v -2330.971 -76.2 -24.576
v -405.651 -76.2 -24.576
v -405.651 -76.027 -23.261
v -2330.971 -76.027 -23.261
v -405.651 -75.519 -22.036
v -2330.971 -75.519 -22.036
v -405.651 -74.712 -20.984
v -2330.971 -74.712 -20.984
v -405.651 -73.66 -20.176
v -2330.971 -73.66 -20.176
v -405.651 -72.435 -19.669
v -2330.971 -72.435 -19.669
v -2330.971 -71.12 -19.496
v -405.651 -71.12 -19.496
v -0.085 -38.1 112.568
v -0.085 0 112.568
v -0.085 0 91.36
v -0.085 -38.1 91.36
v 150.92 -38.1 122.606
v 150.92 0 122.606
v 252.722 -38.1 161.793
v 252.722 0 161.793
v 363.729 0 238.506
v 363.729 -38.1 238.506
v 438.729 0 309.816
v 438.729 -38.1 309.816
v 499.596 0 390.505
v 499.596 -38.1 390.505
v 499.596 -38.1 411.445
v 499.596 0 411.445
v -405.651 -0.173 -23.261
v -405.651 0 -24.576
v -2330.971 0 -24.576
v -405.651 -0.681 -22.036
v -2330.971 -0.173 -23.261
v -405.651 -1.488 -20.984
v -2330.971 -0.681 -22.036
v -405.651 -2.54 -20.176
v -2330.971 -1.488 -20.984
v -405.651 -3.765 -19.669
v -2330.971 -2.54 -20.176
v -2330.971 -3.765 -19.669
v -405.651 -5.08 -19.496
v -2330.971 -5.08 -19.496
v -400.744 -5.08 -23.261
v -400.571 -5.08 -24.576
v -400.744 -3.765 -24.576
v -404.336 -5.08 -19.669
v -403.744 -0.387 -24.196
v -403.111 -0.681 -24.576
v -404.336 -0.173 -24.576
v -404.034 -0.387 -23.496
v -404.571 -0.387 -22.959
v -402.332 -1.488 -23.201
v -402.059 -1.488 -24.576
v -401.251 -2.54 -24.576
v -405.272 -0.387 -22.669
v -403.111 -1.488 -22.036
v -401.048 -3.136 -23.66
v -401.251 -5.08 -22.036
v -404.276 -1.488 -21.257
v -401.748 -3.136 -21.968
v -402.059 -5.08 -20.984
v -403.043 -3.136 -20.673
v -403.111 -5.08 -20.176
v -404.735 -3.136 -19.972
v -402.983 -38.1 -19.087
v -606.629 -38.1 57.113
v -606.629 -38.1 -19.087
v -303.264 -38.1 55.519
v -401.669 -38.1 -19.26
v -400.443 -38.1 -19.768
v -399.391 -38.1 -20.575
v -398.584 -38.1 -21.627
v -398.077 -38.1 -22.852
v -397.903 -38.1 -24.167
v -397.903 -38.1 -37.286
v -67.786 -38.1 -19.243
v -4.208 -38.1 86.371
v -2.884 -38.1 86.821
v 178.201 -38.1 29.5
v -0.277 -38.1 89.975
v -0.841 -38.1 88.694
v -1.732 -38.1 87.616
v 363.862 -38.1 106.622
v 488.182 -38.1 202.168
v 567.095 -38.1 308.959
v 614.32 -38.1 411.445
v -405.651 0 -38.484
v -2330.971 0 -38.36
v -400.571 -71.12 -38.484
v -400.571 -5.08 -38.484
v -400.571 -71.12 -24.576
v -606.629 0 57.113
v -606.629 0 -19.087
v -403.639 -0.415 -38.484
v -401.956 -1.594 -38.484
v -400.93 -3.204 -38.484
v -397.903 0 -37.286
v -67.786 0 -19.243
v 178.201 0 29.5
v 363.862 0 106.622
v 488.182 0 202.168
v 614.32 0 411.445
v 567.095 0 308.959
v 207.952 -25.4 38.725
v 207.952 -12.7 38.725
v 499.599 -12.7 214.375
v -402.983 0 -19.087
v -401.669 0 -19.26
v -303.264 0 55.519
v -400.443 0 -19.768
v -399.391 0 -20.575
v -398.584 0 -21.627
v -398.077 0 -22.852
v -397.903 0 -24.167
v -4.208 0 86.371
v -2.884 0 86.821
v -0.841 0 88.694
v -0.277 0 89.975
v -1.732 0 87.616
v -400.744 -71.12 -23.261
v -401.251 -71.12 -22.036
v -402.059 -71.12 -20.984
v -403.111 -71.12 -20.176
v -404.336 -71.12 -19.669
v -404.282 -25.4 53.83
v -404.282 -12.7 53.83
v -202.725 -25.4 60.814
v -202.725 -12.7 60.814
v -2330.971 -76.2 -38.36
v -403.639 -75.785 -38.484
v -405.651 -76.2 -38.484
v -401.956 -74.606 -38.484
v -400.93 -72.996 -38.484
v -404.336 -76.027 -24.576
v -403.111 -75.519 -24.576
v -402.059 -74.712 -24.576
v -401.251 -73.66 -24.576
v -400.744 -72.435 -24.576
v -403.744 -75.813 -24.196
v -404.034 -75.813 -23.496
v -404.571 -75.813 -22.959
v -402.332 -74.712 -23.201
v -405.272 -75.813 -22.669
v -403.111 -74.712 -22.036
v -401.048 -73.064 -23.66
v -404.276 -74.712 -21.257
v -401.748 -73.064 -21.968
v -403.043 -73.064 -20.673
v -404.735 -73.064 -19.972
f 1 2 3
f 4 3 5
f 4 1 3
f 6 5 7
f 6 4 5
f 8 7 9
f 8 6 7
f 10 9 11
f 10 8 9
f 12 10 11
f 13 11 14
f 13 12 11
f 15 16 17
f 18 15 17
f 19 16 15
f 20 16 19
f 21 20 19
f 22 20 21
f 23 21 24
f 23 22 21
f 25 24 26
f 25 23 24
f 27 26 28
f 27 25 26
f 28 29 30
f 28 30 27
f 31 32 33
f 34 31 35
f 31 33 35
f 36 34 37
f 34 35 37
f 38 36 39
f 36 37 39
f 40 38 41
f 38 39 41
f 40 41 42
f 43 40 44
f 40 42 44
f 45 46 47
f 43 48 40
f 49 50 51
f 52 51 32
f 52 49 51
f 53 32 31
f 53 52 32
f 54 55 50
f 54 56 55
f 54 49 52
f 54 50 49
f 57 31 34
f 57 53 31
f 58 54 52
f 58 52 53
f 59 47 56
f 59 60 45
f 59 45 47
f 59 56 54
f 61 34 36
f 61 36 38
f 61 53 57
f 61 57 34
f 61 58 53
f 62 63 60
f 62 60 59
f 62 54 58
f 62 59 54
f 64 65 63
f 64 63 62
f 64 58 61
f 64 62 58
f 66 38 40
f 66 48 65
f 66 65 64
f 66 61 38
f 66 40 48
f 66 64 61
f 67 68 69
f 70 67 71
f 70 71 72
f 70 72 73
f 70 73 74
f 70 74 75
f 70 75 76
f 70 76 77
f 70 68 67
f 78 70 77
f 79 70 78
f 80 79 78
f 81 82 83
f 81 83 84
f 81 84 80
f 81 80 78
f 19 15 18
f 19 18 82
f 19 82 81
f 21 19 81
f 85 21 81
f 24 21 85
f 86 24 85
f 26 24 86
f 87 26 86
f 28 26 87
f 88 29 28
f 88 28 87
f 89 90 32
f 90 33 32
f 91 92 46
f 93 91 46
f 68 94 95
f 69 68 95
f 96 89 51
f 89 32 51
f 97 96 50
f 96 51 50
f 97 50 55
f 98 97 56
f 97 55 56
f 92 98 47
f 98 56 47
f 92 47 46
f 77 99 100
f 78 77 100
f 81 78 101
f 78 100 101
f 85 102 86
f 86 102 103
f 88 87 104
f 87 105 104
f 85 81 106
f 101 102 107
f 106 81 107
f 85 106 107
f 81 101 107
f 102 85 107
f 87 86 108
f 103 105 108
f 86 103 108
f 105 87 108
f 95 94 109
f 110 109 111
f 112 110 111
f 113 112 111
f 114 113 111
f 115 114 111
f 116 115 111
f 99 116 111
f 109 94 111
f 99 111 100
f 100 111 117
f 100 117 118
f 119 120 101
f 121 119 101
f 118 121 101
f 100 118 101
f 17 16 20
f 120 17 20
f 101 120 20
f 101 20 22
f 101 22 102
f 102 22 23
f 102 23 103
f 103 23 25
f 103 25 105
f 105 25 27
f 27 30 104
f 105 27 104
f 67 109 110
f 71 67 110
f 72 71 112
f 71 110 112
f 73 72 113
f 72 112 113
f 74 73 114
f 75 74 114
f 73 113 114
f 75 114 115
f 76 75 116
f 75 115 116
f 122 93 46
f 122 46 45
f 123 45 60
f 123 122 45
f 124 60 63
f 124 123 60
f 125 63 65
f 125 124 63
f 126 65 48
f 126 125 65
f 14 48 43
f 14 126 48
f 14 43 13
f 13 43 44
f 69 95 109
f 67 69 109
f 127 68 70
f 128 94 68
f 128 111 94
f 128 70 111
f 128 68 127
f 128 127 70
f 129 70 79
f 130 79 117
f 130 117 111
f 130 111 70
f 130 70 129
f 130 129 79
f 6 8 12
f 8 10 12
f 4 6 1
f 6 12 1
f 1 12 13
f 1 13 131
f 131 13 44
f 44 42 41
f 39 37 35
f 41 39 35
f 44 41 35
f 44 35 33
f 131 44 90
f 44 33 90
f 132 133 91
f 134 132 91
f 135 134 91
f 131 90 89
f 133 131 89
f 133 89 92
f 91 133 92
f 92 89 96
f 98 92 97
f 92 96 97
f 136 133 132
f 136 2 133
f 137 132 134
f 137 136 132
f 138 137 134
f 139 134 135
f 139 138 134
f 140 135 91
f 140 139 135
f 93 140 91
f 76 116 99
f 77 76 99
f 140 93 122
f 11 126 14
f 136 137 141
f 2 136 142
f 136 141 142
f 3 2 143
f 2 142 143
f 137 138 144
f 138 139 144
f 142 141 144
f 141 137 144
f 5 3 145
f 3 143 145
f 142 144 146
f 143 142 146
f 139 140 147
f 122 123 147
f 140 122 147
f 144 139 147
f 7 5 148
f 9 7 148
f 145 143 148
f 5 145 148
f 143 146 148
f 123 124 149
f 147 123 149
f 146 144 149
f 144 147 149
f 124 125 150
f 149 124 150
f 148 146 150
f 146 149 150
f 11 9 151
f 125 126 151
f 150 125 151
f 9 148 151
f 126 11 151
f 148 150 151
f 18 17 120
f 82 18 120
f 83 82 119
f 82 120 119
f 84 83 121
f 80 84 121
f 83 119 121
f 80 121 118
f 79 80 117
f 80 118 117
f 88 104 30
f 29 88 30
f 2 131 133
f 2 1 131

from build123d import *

# Parameters (mm, degrees)
F1_DEPTH = 38.1
F3_DEPTH = 76.2
F4_R     = 5.08
F5_R     = 5.08
F6_R     = 5.08


with BuildPart() as f1:
    # F0 (on Front) → F1 (new body)
    with BuildSketch(Plane.XZ):
        with BuildLine():
            add(Edge.make_bspline(
                [(-397.9034916449, -37.2863032911), (410.8181435335, -37.1667715246), (542.3002453184, 229.7381759582), (614.3201670874, 411.4448271791)],
                knots=[0, 0, 0, 0, 1107.2291374194, 1107.2291374194, 1107.2291374194, 1107.2291374194], degree=3))
            Line((614.3201670874, 411.4448271791), (499.5962828133, 411.4448271791))
            Line((499.5962828133, 411.4448271791), (499.5962828133, 390.5045126412))
            add(Edge.make_bspline(
                [(-0.08459932, 112.5677610649), (138.9812140865, 104.8921065828), (289.8373497184, 164.1537835287), (451.0105705046, 310.1172410619), (499.5962828133, 390.5045126412)],
                knots=[0, 0, 0, 0, 0.5062424529, 1, 1, 1, 1], degree=3))
            Line((-0.08459932, 112.5677610649), (-0.08459932, 91.3603947808))
            ThreePointArc((-0.08459932, 91.3603947808), (-1.2489795154, 88.1239891285), (-4.2083479602, 86.37120814))
            add(Edge.make_bspline(
                [(-606.6288212141, 57.1127695403), (-404.6368126357, 51.4652566588), (-200.4539536083, 48.7578373083), (-4.2083479602, 86.37120814)],
                knots=[0, 0, 0, 0, 603.0630991795, 603.0630991795, 603.0630991795, 603.0630991795], degree=3))
            Line((-606.6288212141, 57.1127695403), (-606.6288212141, -19.0872304597))
            Line((-606.6288212141, -19.0872304597), (-402.9834916449, -19.0872304597))
            ThreePointArc((-402.9834916449, -19.0872304597), (-399.3913891965, -20.5751280112), (-397.9034916449, -24.1672304597))
            Line((-397.9034916449, -24.1672304597), (-397.9034916449, -37.2863032911))
        make_face()
    extrude(amount=F1_DEPTH)


with BuildPart() as f3:
    # F2 (on Front) → F3 (new body)
    with BuildSketch(Plane.XZ):
        Polygon((-2330.9707720995, -38.3599539625), (-400.5707720995, -38.4839051044), (-400.5707720995, -19.4956134433), (-2330.9707720995, -19.4956134433), align=None)
    extrude(amount=F3_DEPTH)

    # F4
    f4_edges = [f3.edges().sort_by_distance(p)[0] for p in [
        (-400.570772, -38.1, -19.495613),
    ]]
    fillet(f4_edges, radius=F4_R)

    # F5
    f5_edges = [f3.edges().sort_by_distance(p)[0] for p in [
        (-1368.310772, -76.2, -19.495613),
    ]]
    fillet(f5_edges, radius=F5_R)

    # F6
    f6_edges = [f3.edges().sort_by_distance(p)[0] for p in [
        (-1368.310772, 0, -19.495613),
    ]]
    fillet(f6_edges, radius=F6_R)


solid = Compound([f1.part, f3.part])
